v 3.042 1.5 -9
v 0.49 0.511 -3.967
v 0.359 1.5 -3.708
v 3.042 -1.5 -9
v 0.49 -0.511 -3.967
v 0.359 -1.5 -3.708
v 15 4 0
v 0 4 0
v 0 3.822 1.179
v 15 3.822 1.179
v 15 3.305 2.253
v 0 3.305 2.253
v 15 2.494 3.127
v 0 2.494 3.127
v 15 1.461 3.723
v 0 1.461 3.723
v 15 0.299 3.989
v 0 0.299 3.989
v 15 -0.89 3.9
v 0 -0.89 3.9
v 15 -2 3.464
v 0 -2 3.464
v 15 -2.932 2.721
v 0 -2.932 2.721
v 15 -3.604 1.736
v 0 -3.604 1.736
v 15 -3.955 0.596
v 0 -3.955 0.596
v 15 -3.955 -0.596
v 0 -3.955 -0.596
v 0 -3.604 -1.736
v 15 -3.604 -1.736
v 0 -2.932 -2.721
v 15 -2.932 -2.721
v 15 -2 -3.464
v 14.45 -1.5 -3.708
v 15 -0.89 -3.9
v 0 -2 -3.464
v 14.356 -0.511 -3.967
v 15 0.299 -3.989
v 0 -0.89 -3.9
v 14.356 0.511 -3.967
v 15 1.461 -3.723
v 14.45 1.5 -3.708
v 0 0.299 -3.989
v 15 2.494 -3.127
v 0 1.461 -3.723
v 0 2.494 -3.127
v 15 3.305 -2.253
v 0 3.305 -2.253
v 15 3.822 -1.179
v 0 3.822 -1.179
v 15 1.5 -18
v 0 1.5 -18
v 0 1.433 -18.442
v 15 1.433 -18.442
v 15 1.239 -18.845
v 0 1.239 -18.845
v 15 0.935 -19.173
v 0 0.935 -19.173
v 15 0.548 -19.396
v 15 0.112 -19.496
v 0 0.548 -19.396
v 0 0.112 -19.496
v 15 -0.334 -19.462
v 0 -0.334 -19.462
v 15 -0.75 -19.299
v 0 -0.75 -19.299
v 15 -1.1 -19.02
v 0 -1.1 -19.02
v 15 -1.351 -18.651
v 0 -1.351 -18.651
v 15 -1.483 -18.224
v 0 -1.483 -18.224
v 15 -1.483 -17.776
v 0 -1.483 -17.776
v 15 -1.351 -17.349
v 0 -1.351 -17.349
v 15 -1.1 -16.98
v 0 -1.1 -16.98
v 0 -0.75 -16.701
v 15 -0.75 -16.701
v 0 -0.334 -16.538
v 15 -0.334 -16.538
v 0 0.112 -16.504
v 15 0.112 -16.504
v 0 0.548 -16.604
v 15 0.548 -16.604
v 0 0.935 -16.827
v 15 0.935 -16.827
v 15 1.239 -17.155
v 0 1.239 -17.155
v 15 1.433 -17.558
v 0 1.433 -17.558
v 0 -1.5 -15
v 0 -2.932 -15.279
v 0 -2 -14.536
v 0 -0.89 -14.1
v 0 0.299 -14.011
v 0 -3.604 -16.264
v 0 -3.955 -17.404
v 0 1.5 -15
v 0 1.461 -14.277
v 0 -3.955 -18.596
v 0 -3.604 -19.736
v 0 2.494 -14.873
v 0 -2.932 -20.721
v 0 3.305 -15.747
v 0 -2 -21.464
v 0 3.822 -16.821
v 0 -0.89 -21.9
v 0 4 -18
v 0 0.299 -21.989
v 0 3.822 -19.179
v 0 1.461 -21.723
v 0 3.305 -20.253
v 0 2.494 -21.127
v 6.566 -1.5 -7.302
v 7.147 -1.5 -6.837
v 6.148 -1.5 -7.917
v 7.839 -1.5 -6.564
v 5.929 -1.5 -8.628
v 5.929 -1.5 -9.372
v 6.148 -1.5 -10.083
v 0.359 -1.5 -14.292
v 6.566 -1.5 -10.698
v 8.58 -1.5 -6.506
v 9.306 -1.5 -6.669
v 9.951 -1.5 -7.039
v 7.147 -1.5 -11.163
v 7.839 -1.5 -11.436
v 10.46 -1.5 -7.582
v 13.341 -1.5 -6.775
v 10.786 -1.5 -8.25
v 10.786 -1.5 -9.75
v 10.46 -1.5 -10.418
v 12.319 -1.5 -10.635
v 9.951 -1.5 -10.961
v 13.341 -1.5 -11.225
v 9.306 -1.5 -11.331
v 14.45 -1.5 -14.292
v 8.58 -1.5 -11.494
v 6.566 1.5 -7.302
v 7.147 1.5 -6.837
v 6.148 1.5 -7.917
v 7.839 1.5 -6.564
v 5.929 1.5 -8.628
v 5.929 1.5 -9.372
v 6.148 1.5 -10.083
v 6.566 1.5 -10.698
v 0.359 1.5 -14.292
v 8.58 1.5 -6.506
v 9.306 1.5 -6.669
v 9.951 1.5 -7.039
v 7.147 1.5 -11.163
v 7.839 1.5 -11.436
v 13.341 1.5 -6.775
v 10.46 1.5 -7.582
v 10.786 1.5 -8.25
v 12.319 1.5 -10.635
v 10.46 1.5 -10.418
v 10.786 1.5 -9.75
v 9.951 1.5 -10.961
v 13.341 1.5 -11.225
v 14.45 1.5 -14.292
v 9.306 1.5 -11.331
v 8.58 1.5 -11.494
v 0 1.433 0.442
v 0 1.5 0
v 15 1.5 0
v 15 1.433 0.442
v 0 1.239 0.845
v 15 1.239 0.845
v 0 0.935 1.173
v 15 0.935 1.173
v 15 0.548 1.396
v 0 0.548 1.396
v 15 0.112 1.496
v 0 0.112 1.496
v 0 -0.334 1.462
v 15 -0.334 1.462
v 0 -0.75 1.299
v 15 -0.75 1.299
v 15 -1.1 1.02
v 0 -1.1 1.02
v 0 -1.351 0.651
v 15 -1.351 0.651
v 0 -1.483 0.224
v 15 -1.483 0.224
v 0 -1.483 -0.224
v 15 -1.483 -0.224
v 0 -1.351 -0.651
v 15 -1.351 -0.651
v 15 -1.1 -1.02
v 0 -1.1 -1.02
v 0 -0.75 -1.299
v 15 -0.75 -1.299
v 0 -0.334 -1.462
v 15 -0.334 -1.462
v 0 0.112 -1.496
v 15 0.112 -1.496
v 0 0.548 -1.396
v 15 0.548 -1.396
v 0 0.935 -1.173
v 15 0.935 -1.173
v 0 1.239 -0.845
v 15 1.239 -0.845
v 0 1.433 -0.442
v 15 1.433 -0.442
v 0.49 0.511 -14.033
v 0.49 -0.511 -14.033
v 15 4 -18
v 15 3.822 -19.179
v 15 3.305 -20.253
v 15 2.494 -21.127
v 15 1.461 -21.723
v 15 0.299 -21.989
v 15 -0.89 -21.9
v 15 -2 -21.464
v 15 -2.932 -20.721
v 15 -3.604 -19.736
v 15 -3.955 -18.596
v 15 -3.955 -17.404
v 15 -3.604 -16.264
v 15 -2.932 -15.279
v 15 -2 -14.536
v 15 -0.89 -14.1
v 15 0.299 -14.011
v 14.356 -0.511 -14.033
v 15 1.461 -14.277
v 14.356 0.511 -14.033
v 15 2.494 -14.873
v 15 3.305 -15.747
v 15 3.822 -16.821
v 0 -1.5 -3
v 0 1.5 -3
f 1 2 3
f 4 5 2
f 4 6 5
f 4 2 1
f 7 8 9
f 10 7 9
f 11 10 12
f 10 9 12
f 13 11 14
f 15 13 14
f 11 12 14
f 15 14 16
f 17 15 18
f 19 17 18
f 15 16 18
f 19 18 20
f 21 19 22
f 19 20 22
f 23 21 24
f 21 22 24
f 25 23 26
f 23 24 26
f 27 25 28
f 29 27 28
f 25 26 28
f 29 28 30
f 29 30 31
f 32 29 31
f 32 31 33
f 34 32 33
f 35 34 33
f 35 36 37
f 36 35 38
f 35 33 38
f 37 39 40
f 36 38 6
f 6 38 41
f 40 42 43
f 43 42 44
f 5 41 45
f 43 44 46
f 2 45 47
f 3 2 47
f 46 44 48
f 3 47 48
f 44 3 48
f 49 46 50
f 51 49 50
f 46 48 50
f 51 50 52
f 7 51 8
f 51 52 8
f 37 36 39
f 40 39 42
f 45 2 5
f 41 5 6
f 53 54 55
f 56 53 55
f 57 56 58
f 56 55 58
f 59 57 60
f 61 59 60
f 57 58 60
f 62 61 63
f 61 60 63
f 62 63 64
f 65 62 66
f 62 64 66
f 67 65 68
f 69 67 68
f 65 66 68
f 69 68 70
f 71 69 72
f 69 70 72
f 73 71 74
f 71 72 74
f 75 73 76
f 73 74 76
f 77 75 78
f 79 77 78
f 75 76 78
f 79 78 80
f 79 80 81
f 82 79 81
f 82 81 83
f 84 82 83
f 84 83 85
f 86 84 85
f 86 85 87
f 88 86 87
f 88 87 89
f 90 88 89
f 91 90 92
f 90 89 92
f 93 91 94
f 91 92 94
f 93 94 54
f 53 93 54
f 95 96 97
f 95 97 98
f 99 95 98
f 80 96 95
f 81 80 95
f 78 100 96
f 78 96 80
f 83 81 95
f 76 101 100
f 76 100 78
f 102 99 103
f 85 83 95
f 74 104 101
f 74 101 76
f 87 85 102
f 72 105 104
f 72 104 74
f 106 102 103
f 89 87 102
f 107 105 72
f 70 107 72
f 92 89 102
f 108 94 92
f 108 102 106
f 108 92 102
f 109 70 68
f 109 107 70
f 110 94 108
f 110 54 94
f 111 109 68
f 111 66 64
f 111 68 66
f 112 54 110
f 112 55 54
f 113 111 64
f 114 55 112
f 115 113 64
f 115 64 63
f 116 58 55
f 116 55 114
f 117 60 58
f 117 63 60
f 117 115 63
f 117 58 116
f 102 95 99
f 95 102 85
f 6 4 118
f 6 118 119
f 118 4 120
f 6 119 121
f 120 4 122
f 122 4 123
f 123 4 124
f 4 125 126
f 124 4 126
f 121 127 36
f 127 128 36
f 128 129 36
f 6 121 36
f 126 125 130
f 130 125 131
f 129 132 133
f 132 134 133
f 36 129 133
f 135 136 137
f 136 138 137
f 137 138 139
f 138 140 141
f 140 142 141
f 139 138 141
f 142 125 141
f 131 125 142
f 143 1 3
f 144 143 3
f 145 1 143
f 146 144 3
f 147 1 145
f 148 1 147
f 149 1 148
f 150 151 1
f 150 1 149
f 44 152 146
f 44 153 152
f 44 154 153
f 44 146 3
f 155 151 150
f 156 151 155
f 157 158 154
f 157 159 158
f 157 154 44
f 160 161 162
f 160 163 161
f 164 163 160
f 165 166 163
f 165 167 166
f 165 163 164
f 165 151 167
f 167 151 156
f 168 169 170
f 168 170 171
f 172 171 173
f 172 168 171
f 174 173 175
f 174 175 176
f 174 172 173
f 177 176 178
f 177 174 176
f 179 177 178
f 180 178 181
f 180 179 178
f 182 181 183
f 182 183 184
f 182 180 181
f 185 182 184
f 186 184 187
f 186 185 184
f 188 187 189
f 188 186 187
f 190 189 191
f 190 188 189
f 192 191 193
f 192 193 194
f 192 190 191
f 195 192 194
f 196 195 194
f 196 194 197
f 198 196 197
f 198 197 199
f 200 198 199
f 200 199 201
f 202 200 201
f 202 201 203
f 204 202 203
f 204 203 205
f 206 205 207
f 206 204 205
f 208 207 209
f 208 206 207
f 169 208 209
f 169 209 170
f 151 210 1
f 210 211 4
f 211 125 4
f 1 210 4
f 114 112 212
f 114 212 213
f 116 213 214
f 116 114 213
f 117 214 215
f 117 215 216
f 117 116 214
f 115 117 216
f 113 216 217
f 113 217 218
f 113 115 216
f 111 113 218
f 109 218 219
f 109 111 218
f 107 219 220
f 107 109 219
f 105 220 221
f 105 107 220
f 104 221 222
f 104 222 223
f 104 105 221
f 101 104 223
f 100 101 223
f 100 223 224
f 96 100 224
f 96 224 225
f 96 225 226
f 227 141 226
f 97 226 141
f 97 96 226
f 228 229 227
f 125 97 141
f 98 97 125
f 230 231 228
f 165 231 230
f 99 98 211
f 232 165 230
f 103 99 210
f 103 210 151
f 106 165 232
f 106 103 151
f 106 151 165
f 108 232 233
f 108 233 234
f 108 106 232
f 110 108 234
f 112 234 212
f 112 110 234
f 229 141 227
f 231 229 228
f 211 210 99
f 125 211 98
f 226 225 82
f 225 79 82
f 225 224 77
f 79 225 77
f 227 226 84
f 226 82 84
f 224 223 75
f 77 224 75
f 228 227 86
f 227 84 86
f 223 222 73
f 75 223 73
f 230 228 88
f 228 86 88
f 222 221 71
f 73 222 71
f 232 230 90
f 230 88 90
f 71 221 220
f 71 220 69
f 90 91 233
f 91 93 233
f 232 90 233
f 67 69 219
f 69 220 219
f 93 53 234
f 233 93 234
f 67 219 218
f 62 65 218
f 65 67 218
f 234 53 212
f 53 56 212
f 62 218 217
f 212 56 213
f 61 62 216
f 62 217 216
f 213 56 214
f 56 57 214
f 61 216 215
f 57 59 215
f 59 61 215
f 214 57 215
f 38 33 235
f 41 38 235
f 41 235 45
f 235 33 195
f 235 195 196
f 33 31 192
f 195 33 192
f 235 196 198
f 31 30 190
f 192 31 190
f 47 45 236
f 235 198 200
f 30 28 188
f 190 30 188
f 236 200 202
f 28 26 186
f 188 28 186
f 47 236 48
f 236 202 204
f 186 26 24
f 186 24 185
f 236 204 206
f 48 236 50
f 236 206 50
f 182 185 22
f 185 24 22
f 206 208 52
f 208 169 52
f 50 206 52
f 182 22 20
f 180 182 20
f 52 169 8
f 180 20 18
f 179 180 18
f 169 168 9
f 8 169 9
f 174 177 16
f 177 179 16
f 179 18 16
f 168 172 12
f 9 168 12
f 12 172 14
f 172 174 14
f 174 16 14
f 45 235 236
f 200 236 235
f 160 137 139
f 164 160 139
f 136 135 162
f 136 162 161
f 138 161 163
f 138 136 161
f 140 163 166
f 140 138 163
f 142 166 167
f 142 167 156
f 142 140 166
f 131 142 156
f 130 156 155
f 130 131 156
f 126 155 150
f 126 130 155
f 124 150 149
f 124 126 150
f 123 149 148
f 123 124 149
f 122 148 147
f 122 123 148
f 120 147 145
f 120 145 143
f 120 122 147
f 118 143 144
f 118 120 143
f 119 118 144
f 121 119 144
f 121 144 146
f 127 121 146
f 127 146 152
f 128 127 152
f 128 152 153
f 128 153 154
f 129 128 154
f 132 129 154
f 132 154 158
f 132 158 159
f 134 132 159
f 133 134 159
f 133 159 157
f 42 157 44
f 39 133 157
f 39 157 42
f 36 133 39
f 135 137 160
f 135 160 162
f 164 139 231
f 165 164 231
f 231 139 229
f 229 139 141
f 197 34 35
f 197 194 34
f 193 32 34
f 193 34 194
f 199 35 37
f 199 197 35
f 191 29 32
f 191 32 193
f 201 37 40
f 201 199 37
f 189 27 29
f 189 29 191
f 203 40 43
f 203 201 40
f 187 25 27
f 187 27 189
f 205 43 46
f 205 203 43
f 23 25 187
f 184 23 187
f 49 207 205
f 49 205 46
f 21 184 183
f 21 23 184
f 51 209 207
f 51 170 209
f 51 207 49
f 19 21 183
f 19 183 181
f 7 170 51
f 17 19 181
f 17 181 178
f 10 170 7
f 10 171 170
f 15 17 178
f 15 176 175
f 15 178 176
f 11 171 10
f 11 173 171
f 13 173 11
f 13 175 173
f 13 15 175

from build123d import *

# Parameters (mm, degrees)
F0_R     = 4
F0_R_2   = 1.5
F1_DEPTH = 15
F3_DEPTH = 1.5


with BuildPart() as f1:
    # F0 (on Right) → F1 (new body)
    with BuildSketch(Plane.YZ):
        Circle(F0_R)
        Circle(F0_R_2, mode=Mode.SUBTRACT)
    extrude(amount=F1_DEPTH)

    # F2 (on Front) → F3 (join, symmetric)
    with BuildSketch(Plane.XZ):
        with BuildLine():
            Line((14.70626425, -3), (0, -3))
            Line((0, -3), (4.5474985961, -11.9707668002))
            ThreePointArc((4.5474985961, -11.9707668002), (8.9263863781, -14.1716151823), (12.3194694103, -10.6353206038))
            Line((12.3194694103, -10.6353206038), (10.7860491436, -9.75))
            ThreePointArc((10.7860491436, -9.75), (5.90120114, -9), (10.7860491436, -8.25))
            Line((10.7860491436, -8.25), (13.3405016736, -6.7751861441))
            Line((13.3405016736, -6.7751861441), (14.70626425, -3))
        make_face()
    extrude(amount=F3_DEPTH, both=True)

    # F5: F1 across plane


with BuildPart() as f1_1:
    add(f1.part)
    add(f1.part.mirror(Plane.XY.offset(-9)))


solid = f1_1.part
